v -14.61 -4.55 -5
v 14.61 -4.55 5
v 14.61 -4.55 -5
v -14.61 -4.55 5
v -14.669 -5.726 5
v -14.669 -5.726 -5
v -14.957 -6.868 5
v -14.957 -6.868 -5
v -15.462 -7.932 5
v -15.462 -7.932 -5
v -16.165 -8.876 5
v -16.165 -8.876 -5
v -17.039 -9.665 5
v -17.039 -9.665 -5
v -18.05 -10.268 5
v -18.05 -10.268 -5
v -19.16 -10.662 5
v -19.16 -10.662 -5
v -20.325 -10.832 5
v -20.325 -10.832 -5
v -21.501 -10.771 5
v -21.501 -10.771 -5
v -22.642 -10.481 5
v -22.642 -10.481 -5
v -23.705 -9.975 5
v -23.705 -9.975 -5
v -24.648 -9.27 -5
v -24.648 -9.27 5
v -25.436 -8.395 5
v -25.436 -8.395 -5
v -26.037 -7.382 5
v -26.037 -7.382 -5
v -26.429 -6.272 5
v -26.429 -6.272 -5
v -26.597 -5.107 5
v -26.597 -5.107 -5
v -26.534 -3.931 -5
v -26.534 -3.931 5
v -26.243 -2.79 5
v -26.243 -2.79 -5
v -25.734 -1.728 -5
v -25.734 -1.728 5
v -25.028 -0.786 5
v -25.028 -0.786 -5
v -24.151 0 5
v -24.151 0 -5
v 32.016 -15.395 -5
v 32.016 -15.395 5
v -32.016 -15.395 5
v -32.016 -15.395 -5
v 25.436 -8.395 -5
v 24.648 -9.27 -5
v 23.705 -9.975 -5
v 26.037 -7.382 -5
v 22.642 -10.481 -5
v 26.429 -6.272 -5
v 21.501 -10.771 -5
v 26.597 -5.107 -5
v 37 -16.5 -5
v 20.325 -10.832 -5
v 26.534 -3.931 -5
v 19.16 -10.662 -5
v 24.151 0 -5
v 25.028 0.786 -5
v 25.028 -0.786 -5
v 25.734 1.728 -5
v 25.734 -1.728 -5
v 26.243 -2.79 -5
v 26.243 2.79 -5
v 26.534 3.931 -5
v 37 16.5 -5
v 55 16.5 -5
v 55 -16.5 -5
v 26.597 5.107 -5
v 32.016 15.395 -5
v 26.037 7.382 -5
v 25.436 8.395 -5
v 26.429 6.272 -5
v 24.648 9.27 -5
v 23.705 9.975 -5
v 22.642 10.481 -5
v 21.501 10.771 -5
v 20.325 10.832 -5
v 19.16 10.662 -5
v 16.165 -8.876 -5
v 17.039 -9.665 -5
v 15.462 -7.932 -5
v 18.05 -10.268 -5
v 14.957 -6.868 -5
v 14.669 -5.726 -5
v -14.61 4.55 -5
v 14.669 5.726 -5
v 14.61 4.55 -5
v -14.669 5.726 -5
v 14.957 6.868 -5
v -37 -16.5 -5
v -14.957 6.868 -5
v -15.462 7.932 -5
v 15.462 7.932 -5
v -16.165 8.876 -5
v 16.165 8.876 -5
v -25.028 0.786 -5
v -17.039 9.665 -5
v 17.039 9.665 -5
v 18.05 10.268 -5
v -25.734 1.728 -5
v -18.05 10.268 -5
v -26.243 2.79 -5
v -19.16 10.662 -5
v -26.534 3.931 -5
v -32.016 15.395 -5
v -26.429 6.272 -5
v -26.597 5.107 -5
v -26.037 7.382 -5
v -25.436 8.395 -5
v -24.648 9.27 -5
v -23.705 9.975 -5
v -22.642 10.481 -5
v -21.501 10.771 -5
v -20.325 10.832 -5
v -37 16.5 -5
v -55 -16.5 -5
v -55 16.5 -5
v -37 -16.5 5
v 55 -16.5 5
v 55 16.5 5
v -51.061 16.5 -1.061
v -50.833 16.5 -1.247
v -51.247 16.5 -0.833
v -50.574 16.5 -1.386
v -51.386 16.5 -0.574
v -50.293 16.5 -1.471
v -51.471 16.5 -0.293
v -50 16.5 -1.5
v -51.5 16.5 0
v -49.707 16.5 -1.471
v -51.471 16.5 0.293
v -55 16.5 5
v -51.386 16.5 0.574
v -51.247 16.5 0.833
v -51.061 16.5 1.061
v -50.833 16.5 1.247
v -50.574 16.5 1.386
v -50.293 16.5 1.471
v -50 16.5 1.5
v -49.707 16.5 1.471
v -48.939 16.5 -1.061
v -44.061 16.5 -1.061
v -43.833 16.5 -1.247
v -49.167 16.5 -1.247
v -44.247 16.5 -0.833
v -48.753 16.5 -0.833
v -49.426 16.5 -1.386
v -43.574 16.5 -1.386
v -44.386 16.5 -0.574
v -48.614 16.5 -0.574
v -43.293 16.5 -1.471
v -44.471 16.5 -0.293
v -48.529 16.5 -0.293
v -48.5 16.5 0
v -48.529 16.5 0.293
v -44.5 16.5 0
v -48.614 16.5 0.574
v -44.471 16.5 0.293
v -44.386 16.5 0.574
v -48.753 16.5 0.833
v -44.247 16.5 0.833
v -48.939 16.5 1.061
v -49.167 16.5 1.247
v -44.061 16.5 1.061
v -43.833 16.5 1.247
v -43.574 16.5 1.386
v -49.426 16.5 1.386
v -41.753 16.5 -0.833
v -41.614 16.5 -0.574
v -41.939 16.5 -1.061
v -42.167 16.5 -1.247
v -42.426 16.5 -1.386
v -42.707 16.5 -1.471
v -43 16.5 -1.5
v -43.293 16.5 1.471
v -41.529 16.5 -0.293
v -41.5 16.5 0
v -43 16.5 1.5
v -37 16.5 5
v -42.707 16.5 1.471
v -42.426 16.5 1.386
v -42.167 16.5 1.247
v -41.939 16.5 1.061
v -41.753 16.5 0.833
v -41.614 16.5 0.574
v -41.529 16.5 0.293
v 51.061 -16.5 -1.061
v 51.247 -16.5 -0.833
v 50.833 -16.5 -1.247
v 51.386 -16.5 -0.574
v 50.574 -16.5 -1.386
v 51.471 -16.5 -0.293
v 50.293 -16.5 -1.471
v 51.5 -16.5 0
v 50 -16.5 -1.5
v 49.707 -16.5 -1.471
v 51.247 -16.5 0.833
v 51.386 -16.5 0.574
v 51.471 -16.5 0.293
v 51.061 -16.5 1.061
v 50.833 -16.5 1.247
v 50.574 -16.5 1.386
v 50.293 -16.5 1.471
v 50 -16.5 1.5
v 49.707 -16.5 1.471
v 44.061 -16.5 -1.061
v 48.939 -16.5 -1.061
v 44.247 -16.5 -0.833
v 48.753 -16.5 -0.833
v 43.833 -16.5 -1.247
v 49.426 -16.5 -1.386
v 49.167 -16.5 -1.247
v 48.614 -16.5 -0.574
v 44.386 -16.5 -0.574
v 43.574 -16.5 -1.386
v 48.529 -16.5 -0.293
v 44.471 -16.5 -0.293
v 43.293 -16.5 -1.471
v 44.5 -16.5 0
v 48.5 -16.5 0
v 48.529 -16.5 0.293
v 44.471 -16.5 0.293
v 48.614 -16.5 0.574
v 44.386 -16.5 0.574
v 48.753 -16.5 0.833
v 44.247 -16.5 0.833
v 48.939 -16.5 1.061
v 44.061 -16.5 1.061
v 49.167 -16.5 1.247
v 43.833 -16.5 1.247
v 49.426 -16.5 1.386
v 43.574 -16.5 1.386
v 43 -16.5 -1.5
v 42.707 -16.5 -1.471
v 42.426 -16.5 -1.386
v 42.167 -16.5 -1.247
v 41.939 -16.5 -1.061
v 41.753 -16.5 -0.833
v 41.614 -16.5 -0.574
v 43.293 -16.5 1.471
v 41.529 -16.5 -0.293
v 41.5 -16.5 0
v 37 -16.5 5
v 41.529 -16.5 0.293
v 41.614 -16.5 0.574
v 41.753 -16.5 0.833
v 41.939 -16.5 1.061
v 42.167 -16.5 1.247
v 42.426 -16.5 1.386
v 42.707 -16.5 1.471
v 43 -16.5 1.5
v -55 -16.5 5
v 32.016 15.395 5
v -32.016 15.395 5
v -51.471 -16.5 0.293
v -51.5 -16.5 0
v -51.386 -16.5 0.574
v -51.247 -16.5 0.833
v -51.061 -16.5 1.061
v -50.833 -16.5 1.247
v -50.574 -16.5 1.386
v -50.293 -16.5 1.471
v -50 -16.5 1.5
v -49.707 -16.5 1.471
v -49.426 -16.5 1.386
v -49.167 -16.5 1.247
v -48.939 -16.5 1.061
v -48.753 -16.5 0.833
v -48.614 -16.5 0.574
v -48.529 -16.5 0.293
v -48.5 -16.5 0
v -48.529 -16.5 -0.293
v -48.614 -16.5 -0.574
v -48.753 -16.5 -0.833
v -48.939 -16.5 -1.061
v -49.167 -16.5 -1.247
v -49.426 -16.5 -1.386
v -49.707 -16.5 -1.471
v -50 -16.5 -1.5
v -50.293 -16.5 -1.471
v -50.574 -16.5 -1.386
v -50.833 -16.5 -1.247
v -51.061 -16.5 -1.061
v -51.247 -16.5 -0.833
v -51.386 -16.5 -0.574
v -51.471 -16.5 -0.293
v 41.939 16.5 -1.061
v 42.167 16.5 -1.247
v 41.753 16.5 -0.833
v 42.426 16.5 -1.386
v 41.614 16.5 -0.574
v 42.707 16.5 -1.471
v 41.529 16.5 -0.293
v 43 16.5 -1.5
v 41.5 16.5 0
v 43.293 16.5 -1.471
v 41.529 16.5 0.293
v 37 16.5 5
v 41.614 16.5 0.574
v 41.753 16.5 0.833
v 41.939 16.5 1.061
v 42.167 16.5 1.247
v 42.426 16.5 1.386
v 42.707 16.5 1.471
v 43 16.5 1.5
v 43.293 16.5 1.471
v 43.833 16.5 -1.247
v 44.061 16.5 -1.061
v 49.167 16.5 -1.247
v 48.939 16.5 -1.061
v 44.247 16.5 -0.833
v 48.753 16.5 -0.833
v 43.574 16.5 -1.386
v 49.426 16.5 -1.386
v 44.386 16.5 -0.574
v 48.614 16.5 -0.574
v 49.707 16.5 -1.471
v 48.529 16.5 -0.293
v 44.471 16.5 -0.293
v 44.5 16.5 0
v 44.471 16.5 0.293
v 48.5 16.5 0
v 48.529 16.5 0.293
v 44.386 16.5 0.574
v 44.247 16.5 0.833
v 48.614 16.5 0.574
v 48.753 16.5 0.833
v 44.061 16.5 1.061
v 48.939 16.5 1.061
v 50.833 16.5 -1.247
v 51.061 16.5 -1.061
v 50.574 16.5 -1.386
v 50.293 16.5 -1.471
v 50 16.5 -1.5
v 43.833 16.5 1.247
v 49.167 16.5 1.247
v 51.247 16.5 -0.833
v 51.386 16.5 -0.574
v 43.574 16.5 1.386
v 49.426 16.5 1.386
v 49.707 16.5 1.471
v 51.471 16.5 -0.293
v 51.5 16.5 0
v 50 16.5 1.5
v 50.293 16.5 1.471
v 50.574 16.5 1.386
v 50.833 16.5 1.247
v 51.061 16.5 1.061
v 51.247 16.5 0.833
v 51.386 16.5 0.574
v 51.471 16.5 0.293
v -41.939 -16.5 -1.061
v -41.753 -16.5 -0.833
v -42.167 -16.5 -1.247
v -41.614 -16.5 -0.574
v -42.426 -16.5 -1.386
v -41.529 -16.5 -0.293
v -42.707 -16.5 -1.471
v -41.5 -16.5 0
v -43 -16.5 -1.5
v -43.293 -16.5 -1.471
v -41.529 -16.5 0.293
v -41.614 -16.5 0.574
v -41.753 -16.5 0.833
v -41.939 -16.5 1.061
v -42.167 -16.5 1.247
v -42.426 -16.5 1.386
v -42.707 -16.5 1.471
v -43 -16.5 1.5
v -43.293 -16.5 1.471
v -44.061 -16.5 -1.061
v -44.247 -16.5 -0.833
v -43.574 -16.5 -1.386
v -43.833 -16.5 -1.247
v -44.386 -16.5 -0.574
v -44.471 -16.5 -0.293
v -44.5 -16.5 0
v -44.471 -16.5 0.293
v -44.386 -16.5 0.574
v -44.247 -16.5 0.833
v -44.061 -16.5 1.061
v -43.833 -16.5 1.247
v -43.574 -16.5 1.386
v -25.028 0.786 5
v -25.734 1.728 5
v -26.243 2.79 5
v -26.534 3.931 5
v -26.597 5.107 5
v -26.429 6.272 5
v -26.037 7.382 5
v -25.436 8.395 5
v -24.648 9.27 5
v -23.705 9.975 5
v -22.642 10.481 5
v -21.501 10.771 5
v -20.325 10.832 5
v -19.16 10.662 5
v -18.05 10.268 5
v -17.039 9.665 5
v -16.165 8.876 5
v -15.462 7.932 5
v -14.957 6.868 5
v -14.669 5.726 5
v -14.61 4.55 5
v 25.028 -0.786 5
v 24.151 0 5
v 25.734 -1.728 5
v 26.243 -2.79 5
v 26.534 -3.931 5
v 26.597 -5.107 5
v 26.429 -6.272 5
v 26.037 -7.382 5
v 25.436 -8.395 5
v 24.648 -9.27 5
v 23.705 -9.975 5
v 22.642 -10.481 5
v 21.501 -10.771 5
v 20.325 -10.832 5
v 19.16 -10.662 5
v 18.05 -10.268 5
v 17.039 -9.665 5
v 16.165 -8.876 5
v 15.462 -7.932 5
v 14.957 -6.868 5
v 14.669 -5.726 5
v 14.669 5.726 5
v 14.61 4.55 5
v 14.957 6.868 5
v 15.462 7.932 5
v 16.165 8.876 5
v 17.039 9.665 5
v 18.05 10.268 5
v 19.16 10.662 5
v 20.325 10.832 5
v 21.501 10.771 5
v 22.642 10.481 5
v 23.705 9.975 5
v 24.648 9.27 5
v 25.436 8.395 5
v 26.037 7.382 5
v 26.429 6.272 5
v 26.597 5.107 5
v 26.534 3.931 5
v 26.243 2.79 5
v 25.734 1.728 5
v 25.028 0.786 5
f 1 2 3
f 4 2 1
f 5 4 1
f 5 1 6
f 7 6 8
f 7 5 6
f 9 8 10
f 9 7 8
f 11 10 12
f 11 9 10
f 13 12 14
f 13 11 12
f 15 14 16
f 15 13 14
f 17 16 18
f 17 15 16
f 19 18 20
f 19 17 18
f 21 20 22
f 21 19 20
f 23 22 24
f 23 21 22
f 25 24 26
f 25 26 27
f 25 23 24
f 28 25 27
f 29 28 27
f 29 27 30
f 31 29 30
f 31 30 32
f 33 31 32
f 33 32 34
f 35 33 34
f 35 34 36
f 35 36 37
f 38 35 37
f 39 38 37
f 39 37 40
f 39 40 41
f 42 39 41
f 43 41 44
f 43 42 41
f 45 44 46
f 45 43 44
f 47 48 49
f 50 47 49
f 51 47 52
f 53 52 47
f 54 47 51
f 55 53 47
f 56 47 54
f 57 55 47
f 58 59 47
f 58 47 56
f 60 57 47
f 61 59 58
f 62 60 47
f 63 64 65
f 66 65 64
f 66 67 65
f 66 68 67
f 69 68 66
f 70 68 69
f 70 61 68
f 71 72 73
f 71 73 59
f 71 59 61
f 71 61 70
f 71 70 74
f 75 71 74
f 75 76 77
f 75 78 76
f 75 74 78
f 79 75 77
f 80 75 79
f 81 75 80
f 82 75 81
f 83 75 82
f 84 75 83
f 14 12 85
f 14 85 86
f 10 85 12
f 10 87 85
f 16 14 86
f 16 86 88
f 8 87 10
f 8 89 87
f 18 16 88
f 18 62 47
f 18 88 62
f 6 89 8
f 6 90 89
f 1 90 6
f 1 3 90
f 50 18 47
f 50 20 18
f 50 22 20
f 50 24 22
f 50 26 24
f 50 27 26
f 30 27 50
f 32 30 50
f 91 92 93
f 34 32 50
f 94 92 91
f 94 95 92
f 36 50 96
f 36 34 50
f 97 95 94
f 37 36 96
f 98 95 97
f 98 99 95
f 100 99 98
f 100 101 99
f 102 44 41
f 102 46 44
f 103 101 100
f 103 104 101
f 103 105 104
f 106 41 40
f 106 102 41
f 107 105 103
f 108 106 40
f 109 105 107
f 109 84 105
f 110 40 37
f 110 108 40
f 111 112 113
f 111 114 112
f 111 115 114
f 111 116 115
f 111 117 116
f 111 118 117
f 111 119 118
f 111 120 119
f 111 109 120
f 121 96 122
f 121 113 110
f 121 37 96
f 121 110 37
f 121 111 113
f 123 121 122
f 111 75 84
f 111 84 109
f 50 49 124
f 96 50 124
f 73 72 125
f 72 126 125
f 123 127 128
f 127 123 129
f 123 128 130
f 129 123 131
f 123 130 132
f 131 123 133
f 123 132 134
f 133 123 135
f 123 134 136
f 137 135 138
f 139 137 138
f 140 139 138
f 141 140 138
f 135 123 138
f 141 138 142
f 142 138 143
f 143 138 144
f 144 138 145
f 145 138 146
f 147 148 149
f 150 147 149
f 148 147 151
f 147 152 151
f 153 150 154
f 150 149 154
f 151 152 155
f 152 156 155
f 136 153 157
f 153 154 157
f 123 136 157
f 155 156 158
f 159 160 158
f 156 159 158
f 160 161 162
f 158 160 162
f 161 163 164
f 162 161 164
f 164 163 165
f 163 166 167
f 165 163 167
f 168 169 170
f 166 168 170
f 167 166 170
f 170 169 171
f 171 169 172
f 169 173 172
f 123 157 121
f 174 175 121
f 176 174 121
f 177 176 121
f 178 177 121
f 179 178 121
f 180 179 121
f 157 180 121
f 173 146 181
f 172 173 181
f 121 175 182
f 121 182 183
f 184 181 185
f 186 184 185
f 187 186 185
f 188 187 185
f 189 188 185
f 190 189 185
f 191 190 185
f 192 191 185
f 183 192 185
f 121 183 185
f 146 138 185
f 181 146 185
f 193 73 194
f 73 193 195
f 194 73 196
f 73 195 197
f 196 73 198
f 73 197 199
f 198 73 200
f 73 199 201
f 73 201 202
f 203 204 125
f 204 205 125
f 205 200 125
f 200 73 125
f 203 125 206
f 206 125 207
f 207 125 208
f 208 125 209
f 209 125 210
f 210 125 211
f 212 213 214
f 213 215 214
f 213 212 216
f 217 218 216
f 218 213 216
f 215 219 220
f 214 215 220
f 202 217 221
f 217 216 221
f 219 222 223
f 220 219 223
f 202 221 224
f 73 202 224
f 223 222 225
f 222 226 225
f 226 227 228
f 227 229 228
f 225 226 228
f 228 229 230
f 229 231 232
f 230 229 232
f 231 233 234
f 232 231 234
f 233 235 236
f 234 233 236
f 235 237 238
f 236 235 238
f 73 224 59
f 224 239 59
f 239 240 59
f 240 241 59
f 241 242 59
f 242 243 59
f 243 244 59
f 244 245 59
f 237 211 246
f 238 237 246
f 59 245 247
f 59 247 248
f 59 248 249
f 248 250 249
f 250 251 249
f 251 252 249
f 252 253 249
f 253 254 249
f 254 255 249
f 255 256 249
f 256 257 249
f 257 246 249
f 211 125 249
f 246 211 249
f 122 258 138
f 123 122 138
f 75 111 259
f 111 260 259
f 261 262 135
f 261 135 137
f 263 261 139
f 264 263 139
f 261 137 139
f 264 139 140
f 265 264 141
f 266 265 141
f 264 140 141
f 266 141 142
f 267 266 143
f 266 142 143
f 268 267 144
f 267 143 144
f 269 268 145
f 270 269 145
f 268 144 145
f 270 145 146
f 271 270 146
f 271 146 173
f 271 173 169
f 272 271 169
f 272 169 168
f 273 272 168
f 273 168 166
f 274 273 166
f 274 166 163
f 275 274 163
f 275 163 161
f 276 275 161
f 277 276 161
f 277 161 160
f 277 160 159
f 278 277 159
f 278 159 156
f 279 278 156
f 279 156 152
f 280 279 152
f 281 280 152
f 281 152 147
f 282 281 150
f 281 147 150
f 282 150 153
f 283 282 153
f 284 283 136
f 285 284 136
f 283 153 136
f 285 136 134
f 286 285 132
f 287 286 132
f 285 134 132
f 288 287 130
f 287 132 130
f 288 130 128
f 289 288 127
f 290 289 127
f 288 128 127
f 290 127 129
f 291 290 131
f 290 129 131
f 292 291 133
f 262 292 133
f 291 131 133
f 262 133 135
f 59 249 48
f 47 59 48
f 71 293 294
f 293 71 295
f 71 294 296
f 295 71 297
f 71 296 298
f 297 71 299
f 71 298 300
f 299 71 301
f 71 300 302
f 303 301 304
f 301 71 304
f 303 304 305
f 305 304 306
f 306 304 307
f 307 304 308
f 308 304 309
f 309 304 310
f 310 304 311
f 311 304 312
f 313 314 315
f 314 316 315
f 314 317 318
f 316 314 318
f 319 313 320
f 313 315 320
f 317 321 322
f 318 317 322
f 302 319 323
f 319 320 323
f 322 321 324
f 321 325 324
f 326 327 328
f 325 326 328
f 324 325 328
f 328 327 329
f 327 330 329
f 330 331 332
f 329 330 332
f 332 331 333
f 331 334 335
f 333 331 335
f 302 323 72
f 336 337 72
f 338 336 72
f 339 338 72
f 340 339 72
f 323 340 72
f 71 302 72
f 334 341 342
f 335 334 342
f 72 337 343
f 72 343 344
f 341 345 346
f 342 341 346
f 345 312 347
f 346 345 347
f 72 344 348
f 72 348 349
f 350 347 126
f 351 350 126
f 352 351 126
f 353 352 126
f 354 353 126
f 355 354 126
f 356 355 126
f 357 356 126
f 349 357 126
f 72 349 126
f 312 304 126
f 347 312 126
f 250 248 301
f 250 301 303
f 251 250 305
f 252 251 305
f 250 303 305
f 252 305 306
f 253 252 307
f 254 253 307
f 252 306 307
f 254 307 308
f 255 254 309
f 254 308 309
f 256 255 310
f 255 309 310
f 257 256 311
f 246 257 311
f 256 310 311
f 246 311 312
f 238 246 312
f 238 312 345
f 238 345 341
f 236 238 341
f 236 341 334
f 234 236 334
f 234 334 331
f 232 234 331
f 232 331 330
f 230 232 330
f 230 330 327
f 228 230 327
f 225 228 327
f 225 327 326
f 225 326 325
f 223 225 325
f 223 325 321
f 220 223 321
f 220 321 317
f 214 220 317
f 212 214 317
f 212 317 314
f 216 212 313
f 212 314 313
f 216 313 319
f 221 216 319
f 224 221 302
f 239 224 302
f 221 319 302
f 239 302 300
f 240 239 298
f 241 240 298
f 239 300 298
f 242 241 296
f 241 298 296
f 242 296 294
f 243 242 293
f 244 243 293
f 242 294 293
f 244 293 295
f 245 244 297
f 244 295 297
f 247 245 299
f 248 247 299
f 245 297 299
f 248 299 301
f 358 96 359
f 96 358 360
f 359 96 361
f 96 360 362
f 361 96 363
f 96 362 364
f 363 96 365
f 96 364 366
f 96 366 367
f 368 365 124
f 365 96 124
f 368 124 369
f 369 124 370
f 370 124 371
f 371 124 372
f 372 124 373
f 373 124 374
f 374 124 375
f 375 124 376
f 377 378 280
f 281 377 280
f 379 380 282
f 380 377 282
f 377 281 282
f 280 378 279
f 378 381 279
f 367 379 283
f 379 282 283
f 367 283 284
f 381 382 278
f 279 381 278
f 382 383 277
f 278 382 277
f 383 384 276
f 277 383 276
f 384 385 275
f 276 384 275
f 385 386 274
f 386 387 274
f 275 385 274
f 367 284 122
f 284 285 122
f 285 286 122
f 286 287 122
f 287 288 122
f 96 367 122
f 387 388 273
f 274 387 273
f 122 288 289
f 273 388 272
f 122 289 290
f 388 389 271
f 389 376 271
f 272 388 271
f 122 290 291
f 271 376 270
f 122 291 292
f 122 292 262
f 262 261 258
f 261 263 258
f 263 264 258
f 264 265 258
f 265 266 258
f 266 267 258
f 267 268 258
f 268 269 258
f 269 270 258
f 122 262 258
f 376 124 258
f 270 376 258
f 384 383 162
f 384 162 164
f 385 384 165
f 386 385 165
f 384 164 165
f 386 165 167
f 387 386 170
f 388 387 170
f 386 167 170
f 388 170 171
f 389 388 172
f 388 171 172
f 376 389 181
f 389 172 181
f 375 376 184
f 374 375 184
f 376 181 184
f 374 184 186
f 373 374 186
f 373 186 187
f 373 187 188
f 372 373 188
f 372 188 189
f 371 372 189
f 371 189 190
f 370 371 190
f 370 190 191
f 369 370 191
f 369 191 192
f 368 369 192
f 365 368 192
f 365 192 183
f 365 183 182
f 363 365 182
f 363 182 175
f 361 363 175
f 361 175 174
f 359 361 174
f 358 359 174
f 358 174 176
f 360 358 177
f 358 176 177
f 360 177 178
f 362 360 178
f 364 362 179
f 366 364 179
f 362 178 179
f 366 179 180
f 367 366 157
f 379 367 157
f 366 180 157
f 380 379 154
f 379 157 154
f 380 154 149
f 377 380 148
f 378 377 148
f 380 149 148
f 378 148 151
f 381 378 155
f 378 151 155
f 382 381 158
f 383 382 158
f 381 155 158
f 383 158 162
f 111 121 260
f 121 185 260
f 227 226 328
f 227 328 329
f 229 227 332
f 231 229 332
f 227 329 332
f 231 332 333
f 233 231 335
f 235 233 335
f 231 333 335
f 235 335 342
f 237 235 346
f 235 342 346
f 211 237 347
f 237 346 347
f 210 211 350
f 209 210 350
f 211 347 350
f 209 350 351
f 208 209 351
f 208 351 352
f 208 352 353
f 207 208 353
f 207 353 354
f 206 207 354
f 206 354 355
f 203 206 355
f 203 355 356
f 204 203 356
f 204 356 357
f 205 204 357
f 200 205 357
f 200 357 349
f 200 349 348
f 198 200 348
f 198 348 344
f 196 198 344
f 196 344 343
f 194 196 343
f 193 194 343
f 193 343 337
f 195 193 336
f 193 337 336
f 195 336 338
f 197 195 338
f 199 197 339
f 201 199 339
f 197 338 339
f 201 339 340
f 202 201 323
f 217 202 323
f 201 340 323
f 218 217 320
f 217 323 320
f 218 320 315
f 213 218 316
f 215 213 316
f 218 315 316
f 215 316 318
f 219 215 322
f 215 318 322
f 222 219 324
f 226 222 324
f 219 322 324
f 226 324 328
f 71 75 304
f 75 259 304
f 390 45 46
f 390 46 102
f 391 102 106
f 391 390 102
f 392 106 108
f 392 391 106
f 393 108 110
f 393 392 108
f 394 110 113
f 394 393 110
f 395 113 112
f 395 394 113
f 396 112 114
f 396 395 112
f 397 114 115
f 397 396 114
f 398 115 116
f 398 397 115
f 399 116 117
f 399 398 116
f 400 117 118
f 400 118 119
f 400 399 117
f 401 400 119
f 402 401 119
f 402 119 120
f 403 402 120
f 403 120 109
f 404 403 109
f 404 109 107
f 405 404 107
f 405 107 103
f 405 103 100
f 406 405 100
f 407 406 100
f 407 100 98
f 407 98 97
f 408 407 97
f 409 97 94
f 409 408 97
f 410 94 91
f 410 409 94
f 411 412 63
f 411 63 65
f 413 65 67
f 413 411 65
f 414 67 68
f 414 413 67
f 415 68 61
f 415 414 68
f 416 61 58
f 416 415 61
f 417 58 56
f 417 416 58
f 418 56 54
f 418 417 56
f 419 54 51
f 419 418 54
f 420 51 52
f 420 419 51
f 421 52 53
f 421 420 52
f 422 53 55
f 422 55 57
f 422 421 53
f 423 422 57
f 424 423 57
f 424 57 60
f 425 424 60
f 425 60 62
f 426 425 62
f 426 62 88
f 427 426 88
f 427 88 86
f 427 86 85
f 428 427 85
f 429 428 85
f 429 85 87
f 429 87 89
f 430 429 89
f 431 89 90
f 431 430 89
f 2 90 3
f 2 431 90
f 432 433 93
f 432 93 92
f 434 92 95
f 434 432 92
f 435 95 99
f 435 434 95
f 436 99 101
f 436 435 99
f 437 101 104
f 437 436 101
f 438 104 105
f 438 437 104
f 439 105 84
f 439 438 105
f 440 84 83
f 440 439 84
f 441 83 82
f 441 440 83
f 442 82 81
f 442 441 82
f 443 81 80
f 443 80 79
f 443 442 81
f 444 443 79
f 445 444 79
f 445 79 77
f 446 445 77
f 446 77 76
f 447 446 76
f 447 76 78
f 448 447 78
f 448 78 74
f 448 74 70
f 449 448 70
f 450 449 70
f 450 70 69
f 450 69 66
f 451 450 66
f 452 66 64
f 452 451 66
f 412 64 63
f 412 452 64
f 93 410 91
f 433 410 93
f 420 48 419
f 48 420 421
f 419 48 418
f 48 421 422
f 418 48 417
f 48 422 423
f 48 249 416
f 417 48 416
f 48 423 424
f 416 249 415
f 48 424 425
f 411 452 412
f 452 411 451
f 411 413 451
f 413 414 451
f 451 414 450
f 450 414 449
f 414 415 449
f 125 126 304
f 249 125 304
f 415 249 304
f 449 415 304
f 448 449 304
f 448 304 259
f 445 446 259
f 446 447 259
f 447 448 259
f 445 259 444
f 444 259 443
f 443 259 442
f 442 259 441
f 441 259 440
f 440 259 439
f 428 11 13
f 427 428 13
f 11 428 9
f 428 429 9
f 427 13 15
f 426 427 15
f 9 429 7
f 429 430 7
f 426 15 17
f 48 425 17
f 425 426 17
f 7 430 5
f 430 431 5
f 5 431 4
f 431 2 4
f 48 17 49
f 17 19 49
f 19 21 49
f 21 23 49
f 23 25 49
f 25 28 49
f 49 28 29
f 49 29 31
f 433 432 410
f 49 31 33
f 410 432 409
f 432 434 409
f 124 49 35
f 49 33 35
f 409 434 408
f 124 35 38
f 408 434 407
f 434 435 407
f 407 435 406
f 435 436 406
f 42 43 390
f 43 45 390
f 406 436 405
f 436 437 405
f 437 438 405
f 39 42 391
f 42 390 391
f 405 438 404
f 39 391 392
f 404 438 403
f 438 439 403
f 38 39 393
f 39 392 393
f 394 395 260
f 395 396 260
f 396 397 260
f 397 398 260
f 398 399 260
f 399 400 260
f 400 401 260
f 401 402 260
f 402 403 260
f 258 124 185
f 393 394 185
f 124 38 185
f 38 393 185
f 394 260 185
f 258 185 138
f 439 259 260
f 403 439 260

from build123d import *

# Parameters (mm, degrees)
BOSS_EXTRUDE1_DEPTH = 5
SKETCH3_R           = 1.5
CUT_EXTRUDE1_DEPTH  = 65.335060426


with BuildPart() as part:
    # Sketch1 → Boss-Extrude1 (new, symmetric)
    with BuildSketch(Plane.XY):
        Polygon((-55, 16.5), (-37, 16.5), (-32.015833371, 15.395447006), (32.015833371, 15.395447006), (37, 16.5), (55, 16.5), (55, -16.5), (37, -16.5), (32.015833371, -15.395447006), (-32.015833371, -15.395447006), (-37, -16.5), (-55, -16.5), align=None)
        with BuildLine():
            Line((-14.610208109, 4.550286626), (14.610208109, 4.550286626))
            ThreePointArc((14.610208109, 4.550286626), (23.186065182, 10.254148163), (24.151366397, 0))
            ThreePointArc((24.151366397, 0), (23.186065182, -10.254148163), (14.610208109, -4.550286626))
            Line((14.610208109, -4.550286626), (-14.610208109, -4.550286626))
            ThreePointArc((-14.610208109, -4.550286626), (-23.186065182, -10.254148163), (-24.151366397, 0))
            ThreePointArc((-24.151366397, 0), (-23.186065182, 10.254148163), (-14.610208109, 4.550286626))
        make_face(mode=Mode.SUBTRACT)
    extrude(amount=BOSS_EXTRUDE1_DEPTH, both=True)

    # Sketch3 → Cut-Extrude1 (cut, through all)
    with BuildSketch(Plane(origin=(0, 16.5, 0), x_dir=(1, 0, 0), z_dir=(0, 1, 0))):
        with Locations(Location((-50, 0, 0), (0, 0, 180))):
            Circle(SKETCH3_R)
        with Locations(Location((-43, 0, 0), (0, 0, 180))):
            Circle(SKETCH3_R)
        with Locations(Location((43, 0, 0), (0, 0, 180))):
            Circle(SKETCH3_R)
        with Locations(Location((50, 0, 0), (0, 0, 180))):
            Circle(SKETCH3_R)
    extrude(amount=-CUT_EXTRUDE1_DEPTH, mode=Mode.SUBTRACT)


solid = part.part
